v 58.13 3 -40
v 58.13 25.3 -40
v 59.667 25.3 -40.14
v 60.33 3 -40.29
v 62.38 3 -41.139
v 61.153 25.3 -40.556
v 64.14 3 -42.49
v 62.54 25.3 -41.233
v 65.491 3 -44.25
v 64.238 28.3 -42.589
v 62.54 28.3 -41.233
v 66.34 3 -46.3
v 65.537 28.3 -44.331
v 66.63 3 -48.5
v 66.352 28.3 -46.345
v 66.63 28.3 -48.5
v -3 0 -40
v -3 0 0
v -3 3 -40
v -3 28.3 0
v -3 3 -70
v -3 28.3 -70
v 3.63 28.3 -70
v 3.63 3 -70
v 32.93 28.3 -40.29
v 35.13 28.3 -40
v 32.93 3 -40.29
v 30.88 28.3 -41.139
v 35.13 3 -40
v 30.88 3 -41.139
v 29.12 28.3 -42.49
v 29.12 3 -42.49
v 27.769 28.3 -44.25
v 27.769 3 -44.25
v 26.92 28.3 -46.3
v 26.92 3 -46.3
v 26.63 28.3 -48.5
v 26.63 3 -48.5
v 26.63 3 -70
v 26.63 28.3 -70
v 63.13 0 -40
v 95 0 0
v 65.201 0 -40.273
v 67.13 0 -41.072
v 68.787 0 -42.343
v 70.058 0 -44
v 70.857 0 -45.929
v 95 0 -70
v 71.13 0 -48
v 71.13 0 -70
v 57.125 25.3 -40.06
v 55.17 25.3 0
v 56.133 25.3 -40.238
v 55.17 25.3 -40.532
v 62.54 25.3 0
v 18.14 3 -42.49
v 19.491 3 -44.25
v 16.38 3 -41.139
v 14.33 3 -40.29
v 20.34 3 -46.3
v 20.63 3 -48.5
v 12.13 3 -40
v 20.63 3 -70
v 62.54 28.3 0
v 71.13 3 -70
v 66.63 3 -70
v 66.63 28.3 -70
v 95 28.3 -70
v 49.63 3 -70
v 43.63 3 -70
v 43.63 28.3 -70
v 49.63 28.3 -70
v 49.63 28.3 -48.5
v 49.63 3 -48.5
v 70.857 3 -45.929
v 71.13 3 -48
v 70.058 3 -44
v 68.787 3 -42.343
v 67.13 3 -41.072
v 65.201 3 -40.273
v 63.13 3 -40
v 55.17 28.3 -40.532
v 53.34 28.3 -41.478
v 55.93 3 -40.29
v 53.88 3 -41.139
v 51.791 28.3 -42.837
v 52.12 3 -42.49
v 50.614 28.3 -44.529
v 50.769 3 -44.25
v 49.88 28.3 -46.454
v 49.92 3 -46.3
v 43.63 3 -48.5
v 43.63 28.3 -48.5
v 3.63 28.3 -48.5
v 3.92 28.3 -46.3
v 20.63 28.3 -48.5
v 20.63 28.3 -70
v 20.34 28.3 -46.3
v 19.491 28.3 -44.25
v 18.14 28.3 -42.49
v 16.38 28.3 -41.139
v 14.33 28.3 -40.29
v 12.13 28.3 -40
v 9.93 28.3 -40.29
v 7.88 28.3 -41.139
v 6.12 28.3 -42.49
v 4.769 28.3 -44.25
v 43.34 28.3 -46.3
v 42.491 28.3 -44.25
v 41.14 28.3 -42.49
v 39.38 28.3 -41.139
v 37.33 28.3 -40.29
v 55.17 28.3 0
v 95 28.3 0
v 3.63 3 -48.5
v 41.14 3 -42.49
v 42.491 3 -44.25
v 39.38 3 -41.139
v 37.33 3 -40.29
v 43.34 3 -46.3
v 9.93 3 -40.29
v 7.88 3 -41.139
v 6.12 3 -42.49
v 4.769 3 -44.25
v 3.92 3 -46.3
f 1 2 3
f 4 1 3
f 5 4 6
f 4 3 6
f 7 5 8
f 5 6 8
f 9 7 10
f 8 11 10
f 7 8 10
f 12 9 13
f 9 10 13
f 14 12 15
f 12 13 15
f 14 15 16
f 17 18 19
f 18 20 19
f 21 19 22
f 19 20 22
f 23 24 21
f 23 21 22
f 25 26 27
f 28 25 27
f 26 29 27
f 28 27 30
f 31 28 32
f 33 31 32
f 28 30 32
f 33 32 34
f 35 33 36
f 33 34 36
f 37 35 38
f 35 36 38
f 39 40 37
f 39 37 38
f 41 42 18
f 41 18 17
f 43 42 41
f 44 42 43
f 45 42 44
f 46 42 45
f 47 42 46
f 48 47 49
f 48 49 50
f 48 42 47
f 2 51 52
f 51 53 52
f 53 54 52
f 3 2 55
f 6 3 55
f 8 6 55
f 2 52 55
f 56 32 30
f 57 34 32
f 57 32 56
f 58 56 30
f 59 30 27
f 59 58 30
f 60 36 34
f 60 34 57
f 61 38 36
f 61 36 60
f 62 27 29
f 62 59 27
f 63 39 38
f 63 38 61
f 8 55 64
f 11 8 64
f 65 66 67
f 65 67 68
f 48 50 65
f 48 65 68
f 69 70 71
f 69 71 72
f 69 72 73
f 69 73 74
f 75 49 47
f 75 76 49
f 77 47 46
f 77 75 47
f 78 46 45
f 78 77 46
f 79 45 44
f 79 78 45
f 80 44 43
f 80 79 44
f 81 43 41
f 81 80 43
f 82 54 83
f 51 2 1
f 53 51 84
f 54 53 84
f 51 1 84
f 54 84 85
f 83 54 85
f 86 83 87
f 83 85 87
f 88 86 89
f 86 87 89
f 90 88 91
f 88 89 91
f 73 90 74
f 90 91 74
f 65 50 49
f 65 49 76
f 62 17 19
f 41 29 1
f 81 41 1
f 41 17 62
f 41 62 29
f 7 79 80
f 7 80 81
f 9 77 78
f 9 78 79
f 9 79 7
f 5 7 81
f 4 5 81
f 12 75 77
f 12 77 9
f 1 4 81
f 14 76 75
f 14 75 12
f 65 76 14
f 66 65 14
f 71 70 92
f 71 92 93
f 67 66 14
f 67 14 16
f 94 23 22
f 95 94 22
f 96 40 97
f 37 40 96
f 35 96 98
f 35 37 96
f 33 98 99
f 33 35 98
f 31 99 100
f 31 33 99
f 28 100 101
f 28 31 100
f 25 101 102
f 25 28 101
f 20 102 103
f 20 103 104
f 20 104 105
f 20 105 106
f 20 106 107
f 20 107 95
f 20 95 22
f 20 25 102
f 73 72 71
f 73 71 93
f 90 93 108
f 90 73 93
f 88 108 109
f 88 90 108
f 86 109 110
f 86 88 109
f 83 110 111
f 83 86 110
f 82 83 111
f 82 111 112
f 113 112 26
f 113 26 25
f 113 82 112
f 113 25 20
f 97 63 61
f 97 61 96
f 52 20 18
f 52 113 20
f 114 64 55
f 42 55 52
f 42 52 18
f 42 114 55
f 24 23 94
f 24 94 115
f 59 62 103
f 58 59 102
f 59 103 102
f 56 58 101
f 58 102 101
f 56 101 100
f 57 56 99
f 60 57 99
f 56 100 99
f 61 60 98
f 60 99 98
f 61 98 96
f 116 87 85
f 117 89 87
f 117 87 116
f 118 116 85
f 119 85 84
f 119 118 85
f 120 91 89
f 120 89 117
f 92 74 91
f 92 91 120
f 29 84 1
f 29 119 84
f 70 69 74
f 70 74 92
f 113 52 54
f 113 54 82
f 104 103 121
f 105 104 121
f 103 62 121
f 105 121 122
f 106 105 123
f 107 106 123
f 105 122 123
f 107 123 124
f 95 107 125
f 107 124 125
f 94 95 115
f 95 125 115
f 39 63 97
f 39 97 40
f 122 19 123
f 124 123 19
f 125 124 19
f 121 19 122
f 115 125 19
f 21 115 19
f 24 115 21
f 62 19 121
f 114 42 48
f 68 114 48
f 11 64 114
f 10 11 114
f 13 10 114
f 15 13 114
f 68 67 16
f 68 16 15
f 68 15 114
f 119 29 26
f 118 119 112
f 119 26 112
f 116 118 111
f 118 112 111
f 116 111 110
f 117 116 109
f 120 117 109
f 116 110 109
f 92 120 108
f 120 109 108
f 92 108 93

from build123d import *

# Parameters (mm, degrees)
SKIZZE1_W                       = 95
SKIZZE1_H                       = 70
AUFSATZ_LINEAR_AUSTRAGEN1_DEPTH = 28.3
SCHNITT_LINEAR_AUSTRAGEN1_REACH = 123.35
SKIZZE2_W                       = 7.37
SKIZZE2_H                       = 3
SCHNITT_LINEAR_AUSTRAGEN2_DEPTH = 30
VERRUNDUNG1_R                   = 8.5
AUFSATZ_LINEAR_AUSTRAGEN3_DEPTH = 3
VERRUNDUNG2_R                   = 8


with BuildPart() as part:
    # Skizze1 → Aufsatz-Linear austragen1 (new body)
    with BuildSketch(Plane(origin=(0, 0, 0), x_dir=(1, 0, 0), z_dir=(0, 1, 0))):
        with Locations((47.5, 35)):
            Rectangle(SKIZZE1_W, SKIZZE1_H)
    extrude(amount=AUFSATZ_LINEAR_AUSTRAGEN1_DEPTH)

    # Skizze2 → Schnitt-Linear austragen1 (cut, up to next)
    with BuildSketch(Plane.XY, mode=Mode.PRIVATE) as schnitt_linear_austragen1_sk1:
        with Locations((58.855, 26.8)):
            Rectangle(SKIZZE2_W, SKIZZE2_H)
    schnitt_linear_austragen1_tool1 = extrude(schnitt_linear_austragen1_sk1.sketch, amount=-SCHNITT_LINEAR_AUSTRAGEN1_REACH, mode=Mode.PRIVATE) & part.part
    add(schnitt_linear_austragen1_tool1.solids().sort_by_distance((58.855, 26.8, 0))[0], mode=Mode.SUBTRACT)

    # Skizze4 → Schnitt-Linear austragen2 (cut)
    with BuildSketch(Plane(origin=(0, 0, -70), x_dir=(-1, 0, 0), z_dir=(0, 0, -1))):
        Polygon((-3.63, 0), (-71.13, 0), (-71.13, 3), (-66.63, 3), (-66.63, 28.3), (-49.63, 28.3), (-49.63, 3), (-43.63, 3), (-43.63, 28.3), (-26.63, 28.3), (-26.63, 3), (-20.63, 3), (-20.63, 28.3), (-3.63, 28.3), (-3.63, 3), (0, 3), (0, 0), align=None)
    extrude(amount=-SCHNITT_LINEAR_AUSTRAGEN2_DEPTH, mode=Mode.SUBTRACT)

    # Verrundung1
    verrundung1_edges = [part.edges().sort_by_distance(p)[0] for p in [
        (3.63, 15.65, -40),
        (20.63, 15.65, -40),
        (26.63, 15.65, -40),
        (43.63, 15.65, -40),
        (49.63, 15.65, -40),
        (66.63, 15.65, -40),
    ]]
    fillet(verrundung1_edges, radius=VERRUNDUNG1_R - 0.0001)  # a hair under: the kernel refuses the full size

    # Skizze5 → Aufsatz-Linear austragen3 (add)
    with BuildSketch(Plane.ZY):
        Polygon((0, 0), (-40, 0), (-40, 3), (-70, 3), (-70, 28.3), (0, 28.3), align=None)
    extrude(amount=AUFSATZ_LINEAR_AUSTRAGEN3_DEPTH)

    # Verrundung2
    verrundung2_edges = [part.edges().sort_by_distance(p)[0] for p in [
        (71.13, 1.5, -40),
    ]]
    fillet(verrundung2_edges, radius=VERRUNDUNG2_R)


solid = part.part
